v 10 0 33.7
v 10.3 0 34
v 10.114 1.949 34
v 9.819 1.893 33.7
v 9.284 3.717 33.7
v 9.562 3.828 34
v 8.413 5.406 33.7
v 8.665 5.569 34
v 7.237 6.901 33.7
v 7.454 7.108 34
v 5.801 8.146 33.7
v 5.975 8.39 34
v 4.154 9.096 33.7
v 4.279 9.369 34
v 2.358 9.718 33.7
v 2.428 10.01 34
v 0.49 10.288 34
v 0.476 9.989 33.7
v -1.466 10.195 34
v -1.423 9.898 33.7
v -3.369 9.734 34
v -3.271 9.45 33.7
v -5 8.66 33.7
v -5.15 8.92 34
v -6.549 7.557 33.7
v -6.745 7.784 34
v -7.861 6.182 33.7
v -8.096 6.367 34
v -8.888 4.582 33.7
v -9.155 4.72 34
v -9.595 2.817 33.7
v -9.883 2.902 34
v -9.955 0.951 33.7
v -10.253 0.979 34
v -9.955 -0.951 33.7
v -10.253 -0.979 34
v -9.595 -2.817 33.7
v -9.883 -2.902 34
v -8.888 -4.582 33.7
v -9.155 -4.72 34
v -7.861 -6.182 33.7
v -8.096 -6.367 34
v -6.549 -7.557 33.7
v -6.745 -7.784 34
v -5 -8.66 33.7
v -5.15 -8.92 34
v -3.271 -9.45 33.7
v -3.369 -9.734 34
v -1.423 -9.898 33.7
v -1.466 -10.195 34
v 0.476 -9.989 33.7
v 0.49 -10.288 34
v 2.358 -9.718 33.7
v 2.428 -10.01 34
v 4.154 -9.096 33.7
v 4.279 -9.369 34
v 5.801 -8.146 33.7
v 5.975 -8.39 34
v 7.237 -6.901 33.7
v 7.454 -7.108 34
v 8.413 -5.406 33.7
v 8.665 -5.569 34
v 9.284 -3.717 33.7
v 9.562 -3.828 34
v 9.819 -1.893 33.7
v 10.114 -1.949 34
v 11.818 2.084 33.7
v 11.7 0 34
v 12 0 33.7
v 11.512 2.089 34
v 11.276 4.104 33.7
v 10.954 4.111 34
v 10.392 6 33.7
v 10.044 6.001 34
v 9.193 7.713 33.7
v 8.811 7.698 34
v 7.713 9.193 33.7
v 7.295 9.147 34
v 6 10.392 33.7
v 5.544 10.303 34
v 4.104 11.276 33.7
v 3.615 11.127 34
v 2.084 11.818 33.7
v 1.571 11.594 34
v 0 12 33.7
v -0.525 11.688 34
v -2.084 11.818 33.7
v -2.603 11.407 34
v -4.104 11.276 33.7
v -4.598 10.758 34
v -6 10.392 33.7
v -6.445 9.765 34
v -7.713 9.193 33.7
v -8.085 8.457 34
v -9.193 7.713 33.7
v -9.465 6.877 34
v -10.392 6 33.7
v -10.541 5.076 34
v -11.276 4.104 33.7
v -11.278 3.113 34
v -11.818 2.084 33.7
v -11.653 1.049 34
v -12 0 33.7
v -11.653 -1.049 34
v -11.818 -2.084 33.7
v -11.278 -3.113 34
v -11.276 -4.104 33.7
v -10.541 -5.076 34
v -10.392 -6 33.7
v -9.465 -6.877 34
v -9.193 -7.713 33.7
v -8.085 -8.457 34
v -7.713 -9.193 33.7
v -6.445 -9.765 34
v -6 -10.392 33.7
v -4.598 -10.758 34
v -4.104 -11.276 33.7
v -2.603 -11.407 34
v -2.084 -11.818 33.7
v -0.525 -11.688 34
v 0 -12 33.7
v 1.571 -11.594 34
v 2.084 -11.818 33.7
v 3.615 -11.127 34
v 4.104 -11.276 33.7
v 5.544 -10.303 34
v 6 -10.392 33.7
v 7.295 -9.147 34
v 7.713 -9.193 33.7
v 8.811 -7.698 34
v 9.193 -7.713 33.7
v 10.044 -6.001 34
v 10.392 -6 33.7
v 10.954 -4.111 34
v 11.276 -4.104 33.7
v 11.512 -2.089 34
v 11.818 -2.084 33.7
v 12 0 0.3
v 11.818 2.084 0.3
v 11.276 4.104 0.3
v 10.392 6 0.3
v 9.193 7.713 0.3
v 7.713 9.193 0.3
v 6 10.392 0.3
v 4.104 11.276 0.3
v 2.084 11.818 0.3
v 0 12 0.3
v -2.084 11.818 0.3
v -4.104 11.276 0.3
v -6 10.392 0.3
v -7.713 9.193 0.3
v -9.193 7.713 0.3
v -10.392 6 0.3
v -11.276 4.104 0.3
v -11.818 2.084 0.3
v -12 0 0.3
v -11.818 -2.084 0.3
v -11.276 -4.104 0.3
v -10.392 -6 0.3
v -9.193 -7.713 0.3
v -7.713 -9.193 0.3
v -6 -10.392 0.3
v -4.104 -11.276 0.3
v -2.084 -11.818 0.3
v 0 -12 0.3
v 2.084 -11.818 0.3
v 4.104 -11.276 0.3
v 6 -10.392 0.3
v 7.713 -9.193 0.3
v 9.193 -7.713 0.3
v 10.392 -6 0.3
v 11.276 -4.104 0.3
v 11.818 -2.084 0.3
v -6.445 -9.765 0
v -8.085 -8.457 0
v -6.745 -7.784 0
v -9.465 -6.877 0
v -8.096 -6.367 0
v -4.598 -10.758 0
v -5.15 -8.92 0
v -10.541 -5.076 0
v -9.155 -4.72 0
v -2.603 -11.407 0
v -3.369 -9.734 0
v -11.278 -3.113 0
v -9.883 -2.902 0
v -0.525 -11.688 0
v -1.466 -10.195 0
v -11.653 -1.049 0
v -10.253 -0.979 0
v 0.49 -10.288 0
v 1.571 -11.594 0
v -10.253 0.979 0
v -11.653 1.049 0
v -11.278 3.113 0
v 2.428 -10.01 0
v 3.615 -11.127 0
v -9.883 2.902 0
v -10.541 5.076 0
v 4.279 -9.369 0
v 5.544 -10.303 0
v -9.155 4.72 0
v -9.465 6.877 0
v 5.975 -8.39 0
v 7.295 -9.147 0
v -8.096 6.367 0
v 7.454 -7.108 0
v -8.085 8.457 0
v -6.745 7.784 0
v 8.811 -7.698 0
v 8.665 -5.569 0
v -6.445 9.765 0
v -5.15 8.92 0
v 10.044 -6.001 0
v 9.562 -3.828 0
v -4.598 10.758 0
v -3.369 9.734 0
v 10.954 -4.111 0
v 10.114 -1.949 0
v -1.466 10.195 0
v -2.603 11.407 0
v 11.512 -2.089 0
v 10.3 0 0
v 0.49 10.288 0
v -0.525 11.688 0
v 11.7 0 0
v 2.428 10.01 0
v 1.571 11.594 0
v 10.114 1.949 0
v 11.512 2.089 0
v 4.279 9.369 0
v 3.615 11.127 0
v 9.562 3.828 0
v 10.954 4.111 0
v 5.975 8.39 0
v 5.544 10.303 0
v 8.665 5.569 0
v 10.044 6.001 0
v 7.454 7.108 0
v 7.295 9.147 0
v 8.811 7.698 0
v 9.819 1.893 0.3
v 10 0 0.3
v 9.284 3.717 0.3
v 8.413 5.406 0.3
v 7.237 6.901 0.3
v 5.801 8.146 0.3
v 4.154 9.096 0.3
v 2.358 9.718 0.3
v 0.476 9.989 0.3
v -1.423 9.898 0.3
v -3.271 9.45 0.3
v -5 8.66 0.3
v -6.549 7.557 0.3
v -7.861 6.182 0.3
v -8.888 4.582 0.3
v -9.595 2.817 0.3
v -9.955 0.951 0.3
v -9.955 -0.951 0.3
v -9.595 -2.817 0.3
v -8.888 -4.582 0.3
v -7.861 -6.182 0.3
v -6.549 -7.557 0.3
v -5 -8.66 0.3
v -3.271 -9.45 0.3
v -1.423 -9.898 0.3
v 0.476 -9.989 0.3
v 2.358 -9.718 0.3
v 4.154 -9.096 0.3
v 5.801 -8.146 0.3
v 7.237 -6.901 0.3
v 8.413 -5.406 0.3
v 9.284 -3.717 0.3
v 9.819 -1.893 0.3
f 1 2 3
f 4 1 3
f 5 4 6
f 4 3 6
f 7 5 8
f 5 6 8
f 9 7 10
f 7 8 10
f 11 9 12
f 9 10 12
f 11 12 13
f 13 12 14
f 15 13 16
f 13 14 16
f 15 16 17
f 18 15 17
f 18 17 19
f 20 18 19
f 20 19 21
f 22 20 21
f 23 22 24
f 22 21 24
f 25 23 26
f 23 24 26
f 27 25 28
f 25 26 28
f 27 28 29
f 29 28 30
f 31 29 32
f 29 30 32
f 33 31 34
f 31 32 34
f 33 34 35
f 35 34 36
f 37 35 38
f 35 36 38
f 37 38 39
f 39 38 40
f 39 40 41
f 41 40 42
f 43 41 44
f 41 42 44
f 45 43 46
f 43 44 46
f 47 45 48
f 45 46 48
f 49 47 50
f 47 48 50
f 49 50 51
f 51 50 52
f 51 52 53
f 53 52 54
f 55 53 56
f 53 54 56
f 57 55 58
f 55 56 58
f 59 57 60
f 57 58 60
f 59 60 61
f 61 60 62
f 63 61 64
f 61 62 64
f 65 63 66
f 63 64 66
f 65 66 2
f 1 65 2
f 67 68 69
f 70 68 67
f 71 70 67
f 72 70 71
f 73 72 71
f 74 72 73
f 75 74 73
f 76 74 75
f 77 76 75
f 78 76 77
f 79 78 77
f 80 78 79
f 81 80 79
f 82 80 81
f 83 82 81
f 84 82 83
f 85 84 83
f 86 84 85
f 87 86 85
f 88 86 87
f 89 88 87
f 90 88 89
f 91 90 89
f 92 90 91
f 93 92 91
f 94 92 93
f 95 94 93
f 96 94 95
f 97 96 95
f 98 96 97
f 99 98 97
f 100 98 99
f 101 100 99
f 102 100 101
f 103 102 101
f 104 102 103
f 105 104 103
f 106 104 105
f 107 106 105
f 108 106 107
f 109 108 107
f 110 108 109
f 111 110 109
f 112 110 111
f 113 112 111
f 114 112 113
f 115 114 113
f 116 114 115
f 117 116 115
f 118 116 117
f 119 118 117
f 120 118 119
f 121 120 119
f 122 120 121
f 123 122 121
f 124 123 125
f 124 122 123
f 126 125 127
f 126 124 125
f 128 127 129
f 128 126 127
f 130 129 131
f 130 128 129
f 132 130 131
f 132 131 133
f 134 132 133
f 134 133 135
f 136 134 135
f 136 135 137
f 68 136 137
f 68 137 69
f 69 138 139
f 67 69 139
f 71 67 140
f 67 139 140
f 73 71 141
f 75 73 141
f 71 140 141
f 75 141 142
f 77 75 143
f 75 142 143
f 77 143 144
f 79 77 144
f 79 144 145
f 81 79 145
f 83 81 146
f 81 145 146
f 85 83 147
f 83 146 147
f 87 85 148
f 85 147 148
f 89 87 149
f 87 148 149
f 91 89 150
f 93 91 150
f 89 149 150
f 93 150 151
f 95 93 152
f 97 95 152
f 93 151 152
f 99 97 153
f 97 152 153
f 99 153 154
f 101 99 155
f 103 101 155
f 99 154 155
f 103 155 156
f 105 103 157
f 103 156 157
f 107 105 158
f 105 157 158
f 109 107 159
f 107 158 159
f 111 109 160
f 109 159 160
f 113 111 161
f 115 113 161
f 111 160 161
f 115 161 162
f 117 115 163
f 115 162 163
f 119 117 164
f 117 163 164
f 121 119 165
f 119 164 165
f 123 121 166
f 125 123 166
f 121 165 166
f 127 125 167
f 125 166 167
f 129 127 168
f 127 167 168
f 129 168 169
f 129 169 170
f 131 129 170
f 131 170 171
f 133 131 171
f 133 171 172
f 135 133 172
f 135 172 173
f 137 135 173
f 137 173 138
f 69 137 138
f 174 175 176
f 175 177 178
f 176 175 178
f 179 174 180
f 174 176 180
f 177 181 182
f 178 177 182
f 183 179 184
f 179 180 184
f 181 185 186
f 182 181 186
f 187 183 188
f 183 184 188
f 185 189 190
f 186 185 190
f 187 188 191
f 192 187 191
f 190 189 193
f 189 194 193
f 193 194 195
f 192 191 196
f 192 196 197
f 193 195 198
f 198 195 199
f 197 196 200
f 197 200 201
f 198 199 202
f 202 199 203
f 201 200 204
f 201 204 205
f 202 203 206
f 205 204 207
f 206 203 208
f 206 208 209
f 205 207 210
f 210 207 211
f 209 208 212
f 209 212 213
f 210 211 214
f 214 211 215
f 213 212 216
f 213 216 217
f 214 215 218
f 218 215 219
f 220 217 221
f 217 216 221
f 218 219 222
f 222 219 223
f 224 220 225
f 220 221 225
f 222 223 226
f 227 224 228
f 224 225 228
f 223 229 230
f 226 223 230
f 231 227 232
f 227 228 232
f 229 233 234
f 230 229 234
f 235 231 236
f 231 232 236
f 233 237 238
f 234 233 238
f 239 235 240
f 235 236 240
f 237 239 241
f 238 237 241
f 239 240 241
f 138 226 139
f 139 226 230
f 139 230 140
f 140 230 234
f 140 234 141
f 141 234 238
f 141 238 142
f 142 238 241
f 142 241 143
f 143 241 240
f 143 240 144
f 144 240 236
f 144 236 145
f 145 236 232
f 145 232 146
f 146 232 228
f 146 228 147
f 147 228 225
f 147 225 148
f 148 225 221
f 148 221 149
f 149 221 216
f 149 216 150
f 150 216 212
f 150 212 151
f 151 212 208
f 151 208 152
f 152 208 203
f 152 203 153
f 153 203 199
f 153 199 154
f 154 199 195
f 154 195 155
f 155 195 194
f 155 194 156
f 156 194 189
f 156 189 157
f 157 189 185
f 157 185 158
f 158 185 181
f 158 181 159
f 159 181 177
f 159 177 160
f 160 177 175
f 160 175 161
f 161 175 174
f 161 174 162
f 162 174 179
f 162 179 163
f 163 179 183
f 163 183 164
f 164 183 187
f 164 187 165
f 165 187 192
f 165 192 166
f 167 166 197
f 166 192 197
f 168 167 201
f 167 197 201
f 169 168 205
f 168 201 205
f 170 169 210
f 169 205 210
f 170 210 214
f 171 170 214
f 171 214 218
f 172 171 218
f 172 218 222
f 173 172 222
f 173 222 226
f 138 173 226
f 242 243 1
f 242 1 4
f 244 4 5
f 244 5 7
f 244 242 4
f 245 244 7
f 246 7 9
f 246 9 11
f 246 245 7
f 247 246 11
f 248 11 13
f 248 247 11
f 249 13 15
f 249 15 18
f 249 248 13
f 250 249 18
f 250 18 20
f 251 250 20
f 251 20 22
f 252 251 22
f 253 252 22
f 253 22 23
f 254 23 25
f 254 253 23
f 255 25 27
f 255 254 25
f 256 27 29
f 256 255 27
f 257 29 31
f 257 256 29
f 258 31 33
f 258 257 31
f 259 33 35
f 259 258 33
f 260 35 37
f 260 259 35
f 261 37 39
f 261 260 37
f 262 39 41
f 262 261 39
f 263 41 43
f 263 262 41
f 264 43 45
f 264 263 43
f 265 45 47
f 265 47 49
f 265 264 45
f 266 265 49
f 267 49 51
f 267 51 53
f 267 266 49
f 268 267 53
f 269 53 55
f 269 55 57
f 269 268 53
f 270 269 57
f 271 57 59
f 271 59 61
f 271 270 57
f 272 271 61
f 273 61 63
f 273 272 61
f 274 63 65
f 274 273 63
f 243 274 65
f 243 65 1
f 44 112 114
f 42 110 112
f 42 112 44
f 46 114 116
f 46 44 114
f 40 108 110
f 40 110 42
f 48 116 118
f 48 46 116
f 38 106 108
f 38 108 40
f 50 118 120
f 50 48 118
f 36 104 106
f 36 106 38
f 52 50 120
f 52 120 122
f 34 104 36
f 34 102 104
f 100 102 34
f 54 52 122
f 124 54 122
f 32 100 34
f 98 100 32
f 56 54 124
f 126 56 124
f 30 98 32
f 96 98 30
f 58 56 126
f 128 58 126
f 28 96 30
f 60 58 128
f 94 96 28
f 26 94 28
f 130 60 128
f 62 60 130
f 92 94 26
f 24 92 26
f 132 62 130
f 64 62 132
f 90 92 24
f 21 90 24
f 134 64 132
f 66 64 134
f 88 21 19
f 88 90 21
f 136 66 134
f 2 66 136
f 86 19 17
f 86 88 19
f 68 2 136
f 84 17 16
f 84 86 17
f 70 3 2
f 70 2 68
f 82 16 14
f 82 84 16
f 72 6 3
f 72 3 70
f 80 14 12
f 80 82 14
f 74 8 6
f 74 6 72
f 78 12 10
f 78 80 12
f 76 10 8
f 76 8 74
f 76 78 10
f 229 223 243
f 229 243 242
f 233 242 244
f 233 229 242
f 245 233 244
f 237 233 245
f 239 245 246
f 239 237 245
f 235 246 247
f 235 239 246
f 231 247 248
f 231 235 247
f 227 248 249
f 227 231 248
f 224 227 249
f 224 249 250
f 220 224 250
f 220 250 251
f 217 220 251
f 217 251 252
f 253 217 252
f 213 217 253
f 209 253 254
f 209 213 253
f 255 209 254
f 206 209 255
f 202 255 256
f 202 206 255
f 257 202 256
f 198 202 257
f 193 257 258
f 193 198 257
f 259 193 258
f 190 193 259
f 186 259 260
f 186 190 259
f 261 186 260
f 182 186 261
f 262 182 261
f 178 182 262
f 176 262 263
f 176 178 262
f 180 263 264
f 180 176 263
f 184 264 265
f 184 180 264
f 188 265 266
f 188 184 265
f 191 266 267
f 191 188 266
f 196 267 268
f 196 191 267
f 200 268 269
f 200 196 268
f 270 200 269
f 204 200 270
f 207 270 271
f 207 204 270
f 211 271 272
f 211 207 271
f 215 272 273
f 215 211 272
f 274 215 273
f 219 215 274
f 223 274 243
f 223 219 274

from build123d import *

# Parameters (mm, degrees)
SCHIZZO1_R                   = 12
SCHIZZO1_R_2                 = 10
ESTRUSIONE_ESTRUSIONE1_DEPTH = 34
SMUSSO1_SIZE                 = 0.3


with BuildPart() as part:
    # Schizzo1 → Estrusione-Estrusione1 (new body)
    with BuildSketch(Plane.XY):
        Circle(SCHIZZO1_R)
        Circle(SCHIZZO1_R_2, mode=Mode.SUBTRACT)
    extrude(amount=ESTRUSIONE_ESTRUSIONE1_DEPTH)

    # Smusso1
    smusso1_edges = [part.edges().sort_by_distance(p)[0] for p in [
        (-12, 0, 0),
        (-12, 0, 34),
        (-10, 0, 0),
        (-10, 0, 34),
    ]]
    chamfer(smusso1_edges, length=SMUSSO1_SIZE)


solid = part.part
